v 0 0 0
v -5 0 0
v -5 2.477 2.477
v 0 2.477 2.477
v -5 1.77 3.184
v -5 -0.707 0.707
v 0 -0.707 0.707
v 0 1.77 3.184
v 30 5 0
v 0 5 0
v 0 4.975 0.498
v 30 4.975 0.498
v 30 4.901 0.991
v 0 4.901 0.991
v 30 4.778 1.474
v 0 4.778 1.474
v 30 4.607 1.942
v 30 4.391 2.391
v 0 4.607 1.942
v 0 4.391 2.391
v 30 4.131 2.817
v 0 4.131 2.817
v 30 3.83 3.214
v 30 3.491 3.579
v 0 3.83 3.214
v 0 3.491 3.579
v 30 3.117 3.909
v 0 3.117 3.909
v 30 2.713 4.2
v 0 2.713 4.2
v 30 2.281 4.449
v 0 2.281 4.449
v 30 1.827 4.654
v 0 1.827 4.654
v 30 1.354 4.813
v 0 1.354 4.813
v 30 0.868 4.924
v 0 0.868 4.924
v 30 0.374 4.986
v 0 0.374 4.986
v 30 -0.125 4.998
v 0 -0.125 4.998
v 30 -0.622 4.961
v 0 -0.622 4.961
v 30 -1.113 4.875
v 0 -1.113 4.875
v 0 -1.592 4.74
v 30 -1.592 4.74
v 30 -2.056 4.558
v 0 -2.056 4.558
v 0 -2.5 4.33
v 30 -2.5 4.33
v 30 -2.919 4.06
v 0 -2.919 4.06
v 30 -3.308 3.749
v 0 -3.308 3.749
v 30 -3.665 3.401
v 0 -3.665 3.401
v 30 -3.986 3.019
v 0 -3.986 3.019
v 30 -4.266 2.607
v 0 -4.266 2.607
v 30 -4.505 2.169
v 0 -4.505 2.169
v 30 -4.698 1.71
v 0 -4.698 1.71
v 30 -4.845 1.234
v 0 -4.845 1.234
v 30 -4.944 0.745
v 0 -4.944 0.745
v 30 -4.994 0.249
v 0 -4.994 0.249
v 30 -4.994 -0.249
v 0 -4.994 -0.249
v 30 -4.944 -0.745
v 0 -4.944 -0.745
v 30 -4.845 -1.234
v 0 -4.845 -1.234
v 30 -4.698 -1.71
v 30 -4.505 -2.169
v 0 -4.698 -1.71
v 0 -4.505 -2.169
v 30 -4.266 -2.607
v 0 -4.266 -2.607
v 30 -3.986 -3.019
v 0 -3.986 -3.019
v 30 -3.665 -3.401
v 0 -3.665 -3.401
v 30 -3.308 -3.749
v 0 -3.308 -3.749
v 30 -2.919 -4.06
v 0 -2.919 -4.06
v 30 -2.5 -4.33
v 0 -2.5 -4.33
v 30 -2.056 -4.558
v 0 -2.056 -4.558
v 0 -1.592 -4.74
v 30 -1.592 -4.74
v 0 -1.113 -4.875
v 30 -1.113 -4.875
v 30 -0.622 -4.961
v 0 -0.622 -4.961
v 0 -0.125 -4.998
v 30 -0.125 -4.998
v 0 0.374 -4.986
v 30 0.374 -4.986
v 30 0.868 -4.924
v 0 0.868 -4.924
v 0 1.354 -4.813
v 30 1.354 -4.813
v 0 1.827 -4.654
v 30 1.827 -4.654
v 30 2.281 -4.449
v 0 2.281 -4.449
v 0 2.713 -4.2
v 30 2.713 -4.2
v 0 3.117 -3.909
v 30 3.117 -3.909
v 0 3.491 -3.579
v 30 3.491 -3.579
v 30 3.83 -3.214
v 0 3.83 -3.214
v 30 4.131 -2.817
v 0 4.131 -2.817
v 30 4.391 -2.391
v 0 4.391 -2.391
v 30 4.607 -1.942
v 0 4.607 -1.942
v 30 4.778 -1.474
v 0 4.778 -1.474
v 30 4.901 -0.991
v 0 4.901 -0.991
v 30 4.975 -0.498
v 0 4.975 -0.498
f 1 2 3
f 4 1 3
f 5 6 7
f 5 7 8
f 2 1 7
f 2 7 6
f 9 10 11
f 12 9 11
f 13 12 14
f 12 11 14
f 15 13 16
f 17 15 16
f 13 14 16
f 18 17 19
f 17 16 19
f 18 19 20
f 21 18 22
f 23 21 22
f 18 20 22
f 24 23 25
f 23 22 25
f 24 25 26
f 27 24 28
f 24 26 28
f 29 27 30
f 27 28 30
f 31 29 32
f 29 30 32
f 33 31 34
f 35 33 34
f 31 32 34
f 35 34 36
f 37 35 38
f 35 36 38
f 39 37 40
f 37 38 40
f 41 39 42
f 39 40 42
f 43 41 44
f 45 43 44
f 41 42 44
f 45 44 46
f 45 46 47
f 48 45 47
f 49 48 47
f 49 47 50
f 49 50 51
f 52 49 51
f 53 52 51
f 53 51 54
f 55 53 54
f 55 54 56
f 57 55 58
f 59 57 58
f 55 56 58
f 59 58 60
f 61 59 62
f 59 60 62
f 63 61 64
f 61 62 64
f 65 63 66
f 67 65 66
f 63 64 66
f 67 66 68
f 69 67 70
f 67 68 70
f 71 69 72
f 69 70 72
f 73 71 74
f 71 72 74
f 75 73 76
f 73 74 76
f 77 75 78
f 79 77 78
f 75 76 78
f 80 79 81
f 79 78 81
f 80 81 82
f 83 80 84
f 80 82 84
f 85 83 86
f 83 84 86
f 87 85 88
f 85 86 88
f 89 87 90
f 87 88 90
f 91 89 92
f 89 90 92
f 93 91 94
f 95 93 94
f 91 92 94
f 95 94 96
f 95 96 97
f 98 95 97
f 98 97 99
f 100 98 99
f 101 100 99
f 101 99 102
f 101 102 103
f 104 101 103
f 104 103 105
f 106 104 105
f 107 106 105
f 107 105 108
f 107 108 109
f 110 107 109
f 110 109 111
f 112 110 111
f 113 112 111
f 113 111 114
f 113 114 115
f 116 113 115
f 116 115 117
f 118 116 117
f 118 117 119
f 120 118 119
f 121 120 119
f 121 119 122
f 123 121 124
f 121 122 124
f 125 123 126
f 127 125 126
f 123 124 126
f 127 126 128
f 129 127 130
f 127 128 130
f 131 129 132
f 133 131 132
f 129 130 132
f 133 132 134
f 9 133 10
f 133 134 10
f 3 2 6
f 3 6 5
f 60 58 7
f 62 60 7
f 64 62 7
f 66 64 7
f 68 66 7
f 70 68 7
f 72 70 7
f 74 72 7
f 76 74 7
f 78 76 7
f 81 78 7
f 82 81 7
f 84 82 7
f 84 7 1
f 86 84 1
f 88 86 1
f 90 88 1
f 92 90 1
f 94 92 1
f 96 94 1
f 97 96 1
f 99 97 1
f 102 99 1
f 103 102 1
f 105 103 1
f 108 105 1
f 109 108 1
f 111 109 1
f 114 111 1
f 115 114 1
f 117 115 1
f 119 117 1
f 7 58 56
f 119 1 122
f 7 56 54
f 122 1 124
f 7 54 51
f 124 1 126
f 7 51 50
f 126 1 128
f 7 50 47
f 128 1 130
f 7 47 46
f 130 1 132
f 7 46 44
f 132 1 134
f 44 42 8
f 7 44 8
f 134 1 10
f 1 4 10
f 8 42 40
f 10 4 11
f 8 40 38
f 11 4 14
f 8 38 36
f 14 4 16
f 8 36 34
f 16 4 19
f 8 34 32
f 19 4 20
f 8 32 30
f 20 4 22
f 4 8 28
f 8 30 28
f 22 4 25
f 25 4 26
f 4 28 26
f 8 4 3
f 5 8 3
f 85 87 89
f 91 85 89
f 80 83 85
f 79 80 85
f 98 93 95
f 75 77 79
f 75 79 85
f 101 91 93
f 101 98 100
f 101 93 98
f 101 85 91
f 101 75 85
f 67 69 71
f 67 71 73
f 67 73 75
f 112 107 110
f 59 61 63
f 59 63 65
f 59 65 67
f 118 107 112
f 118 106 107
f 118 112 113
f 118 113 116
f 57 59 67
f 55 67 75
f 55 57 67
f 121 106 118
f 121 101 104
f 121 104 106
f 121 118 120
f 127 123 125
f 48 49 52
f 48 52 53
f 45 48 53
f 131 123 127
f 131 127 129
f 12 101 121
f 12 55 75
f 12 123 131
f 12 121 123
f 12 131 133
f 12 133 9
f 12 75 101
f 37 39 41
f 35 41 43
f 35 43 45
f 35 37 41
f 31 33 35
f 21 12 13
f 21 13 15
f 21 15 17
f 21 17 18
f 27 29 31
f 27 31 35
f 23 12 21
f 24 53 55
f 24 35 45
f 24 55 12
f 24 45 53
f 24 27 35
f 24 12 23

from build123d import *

# Parameters (mm, degrees)
F0_R     = 5
F1_DEPTH = 30
F2_E1_W  = 3.5025208565
F2_E1_H  = 5
F3_DEPTH = 1


with BuildPart() as f1:
    # F0 (on Right) → F1 (new body)
    with BuildSketch(Plane.YZ):
        Circle(F0_R)
    extrude(amount=F1_DEPTH)

    # F2_E1 (on explicit) → F3 (join)
    with BuildSketch(Plane(origin=(0, 0, 0), x_dir=(0, 0.7071067812, 0.7071067812), z_dir=(0, -0.7071067812, 0.7071067812))):
        with Locations((1.7512604282, 2.5)):
            Rectangle(F2_E1_W, F2_E1_H)
    extrude(amount=F3_DEPTH)


solid = f1.part
